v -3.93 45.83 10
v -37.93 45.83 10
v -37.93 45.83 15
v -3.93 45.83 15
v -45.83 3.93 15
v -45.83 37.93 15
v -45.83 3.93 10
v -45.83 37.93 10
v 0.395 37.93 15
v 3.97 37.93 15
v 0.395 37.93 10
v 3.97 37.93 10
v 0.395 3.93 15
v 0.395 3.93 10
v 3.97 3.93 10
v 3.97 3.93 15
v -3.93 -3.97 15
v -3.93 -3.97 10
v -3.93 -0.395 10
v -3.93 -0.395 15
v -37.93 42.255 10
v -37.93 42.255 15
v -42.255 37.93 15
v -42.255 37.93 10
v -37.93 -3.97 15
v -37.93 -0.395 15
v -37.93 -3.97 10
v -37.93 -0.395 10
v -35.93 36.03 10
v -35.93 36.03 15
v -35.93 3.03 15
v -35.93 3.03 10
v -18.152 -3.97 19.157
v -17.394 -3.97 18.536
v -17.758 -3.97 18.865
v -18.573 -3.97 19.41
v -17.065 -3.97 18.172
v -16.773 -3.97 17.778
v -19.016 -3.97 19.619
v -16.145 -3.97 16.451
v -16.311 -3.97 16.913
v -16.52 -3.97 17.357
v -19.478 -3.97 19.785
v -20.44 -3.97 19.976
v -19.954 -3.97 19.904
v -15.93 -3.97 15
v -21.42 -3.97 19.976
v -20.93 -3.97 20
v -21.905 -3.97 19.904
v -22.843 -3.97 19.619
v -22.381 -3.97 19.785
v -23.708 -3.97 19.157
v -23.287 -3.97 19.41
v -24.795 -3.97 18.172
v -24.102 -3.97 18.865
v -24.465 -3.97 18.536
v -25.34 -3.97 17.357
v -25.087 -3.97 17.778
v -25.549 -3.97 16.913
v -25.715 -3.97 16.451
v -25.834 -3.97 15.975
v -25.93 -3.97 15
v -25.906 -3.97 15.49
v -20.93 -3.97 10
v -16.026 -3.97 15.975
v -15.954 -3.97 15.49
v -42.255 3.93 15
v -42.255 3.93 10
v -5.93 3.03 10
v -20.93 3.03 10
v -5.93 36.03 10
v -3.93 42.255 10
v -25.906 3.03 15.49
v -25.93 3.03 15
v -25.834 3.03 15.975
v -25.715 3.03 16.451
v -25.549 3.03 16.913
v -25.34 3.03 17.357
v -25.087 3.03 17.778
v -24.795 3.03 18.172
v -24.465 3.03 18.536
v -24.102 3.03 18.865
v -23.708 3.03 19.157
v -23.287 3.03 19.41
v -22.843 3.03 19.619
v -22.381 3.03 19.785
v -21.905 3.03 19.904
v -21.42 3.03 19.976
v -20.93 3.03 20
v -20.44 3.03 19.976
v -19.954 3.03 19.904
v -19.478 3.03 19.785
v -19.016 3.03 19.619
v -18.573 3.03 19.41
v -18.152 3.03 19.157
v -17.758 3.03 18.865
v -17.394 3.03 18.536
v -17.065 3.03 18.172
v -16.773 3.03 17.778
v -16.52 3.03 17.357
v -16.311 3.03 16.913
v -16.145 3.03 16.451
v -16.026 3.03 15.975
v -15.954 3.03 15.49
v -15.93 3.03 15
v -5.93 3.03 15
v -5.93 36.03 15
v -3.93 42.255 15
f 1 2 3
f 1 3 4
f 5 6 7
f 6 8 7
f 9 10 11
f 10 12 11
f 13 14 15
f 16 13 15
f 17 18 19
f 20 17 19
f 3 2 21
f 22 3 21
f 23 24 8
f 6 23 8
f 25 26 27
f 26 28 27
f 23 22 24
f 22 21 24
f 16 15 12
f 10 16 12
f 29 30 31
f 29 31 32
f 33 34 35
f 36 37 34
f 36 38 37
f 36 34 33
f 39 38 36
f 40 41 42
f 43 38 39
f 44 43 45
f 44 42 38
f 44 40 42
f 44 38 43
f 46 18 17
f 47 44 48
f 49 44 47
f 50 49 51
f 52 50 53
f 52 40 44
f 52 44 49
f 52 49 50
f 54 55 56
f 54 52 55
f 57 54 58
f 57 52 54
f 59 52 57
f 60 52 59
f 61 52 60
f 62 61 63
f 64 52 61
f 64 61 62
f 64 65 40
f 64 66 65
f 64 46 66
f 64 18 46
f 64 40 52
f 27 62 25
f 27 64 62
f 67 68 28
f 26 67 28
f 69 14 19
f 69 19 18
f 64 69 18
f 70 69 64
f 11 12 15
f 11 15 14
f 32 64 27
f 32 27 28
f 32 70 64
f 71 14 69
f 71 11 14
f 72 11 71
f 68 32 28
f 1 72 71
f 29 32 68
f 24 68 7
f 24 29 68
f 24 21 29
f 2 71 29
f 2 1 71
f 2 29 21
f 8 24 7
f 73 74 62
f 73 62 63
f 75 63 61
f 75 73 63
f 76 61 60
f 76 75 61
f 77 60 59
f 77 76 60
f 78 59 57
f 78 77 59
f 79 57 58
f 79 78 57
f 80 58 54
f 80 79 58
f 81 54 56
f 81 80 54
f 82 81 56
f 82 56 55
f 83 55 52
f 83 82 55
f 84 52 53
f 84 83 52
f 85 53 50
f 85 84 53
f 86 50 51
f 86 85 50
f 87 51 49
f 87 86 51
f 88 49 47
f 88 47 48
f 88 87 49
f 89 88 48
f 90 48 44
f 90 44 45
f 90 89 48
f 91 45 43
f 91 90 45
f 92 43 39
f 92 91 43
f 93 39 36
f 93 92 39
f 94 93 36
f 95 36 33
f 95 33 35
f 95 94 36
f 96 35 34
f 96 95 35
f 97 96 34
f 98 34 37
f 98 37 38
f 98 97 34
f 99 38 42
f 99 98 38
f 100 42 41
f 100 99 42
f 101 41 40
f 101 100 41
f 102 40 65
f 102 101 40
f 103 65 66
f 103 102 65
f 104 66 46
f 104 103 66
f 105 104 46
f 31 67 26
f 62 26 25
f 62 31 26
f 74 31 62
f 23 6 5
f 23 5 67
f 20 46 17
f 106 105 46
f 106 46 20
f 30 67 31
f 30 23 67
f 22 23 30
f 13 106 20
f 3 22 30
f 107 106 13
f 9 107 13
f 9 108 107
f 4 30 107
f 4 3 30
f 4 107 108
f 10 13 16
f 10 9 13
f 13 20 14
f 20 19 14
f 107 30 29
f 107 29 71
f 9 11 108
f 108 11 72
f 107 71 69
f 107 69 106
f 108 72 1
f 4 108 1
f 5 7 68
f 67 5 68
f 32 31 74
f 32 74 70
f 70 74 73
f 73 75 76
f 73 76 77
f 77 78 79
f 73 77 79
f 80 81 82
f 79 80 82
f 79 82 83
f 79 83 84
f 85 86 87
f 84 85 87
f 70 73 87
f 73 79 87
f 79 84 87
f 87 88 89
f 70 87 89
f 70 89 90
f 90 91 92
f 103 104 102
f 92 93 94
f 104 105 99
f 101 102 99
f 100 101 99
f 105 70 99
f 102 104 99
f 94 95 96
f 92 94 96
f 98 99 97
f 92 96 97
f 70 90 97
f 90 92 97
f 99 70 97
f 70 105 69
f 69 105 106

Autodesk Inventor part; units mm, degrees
ref_plane "YZ Plane" through (0, 0, 0) normal (1, 0, 0) x (0, 1, 0)
ref_plane "XZ Plane" through (0, 0, 0) normal (0, 1, 0) x (-1, 0, 0)
ref_plane "Work Plane1" through (0, 0, 10) normal (0, 0, 1) x (1, 0, 0)
sketch "Sketch1" plane through (0, 0, 10) normal (0, 0, 1) x (1, 0, 0)
  line L0 (-4.0299, -0.3538) -> (-2.2322, 1.4439) construction
  arc A0 (-1.4439, 2.2322) -> (-2.2322, 1.4439) centre (-0.9299, 0.9299) ccw construction
  line L1 (-1.4439, 2.2322) -> (0.3538, 4.0299) construction
  line L2 (-37.8299, 42.2137) -> (-37.8299, 45.8299) construction
  line L3 (-37.8299, 45.8299) -> (-4.0299, 45.8299) construction
  line L4 (-4.0299, 45.8299) -> (-4.0299, 42.2137) construction
  line L5 (-4.0299, 4.0299) -> (0.3538, 4.0299) projected
  circle A1 centre (-20.9299, 20.9299) radius 17.5 projected
  line L6 (-20.9299, 58.9723) -> (17.1124, 20.9299) construction
  line L7 (17.1124, 20.9299) -> (-20.9299, -17.1124) construction
  line L8 (-20.9299, -17.1124) -> (-58.9723, 20.9299) construction
  line L9 (-58.9723, 20.9299) -> (-20.9299, 58.9723) construction
  line L10 (-20.9299, 58.9723) -> (-20.9299, -17.1124) construction
  line L11 (17.1124, 20.9299) -> (-58.9723, 20.9299) construction
  line L12 (-20.9299, 58.9723) -> (32.8701, 58.9723) construction
  line L13 (-43.4299, 43.4299) -> (1.5701, 43.4299) construction
  line L14 (1.5701, 43.4299) -> (1.5701, -1.5701) construction
  line L15 (1.5701, -1.5701) -> (-43.4299, -1.5701) construction
  line L16 (-43.4299, -1.5701) -> (-43.4299, 43.4299) construction
  line L17 (-43.4299, 43.4299) -> (1.5701, -1.5701) construction
  line L18 (1.5701, 43.4299) -> (-43.4299, -1.5701) construction
  line L19 (-43.4299, 5.3876) -> (-43.4299, 36.4723)
  line L20 (-43.4299, 36.4723) -> (-36.4723, 43.4299)
  line L21 (-36.4723, 43.4299) -> (-5.3876, 43.4299)
  line L22 (-5.3876, 43.4299) -> (1.5701, 36.4723)
  line L23 (1.5701, 36.4723) -> (1.5701, 5.3876)
  line L24 (1.5701, 5.3876) -> (-5.3876, -1.5701)
  line L25 (-5.3876, -1.5701) -> (-36.4723, -1.5701)
  line L26 (-36.4723, -1.5701) -> (-43.4299, 5.3876)
  line L27 (-4.0299, 42.2137) -> (-37.8299, 42.2137) projected
  line L28 (-4.0299, -0.3538) -> (-4.0299, 4.0299) projected
  circle A2 centre (-20.9299, 20.9299) radius 0.4266
  point P0 (-37.8299, 4.0299)
  dimension "d18" = 53.8
  dimension "d19" = 45
  dimension "d20" = 53.8
  dimension "d21" = 45
  dimension "d22" = 45
extrude "Extrusion1" add sketch "Sketch1" along normal blind 5 contours L28 L24 L25 L26 L19 L20 L27 L22 L23 L5 | L5 L24 L28 | L27 L20 L21 L22 | A1
sketch "Sketch3" plane through (0, 0, 10) normal (0, 0, -1) x (-1, 0, 0)
  line L0 (37.8299, -0.4701) -> (37.8299, 4.0299) construction
  line L1 (4.0299, 4.0299) -> (4.0299, -0.4701) construction
  line L2 (37.8299, -0.4701) -> (37.8299, 1.1886) construction
  line L3 (4.0299, -3.9701) -> (4.0299, -0.3538) construction
  line L4 (45.8299, 4.0299) -> (42.2137, 4.0299) construction
  line L5 (-0.3538, 4.0299) -> (-3.9701, 4.0299) construction
  line L6 (-3.9701, 37.8299) -> (-0.3538, 37.8299) construction
  line L7 (4.0299, 42.2137) -> (4.0299, 45.8299) construction
  line L8 (37.8299, 45.8299) -> (37.8299, 42.2137) construction
  line L9 (42.2137, 37.8299) -> (45.8299, 37.8299) construction
  line L10 (37.8299, 37.7299) -> (45.8299, 37.7299)
  line L11 (45.8299, 37.7299) -> (45.8299, 4.1299)
  line L12 (45.8299, 4.1299) -> (37.8299, 4.1299)
  line L13 (37.8299, 4.1299) -> (37.8299, 37.7299)
  line L14 (37.7299, 4.0299) -> (4.1299, 4.0299)
  line L15 (4.1299, 4.0299) -> (4.1299, -3.9701)
  line L16 (4.1299, -3.9701) -> (37.7299, -3.9701)
  line L17 (37.7299, -3.9701) -> (37.7299, 4.0299)
  line L18 (4.0299, 4.1299) -> (-3.9701, 4.1299)
  line L19 (-3.9701, 4.1299) -> (-3.9701, 37.7299)
  line L20 (-3.9701, 37.7299) -> (4.0299, 37.7299)
  line L21 (4.0299, 37.7299) -> (4.0299, 4.1299)
  line L22 (4.1299, 37.8299) -> (37.7299, 37.8299)
  line L23 (37.7299, 37.8299) -> (37.7299, 45.8299)
  line L24 (37.7299, 45.8299) -> (4.1299, 45.8299)
  line L25 (4.1299, 45.8299) -> (4.1299, 37.8299)
  point P0 (0, 0)
  dimension "d23" = 0.1
  dimension "d24" = 0.1
  dimension "d25" = 0.1
  dimension "d26" = 0.1
  dimension "d27" = 0.1
extrude "Extrusion3" add sketch "Sketch3" against normal up to surface (5 mm away)
sketch "Skizze12" plane through (0, 0, 10) normal (0, 0, -1) x (-1, 0, 0)
  line L0 (-0.3124, 4.1299) -> (4.1299, -0.3124) projected
  line L1 (4.1299, -0.3124) -> (4.1299, -3.9701) projected
  line L2 (4.1299, -3.9701) -> (37.7299, -3.9701) construction
  line L3 (37.7299, -3.9701) -> (37.7299, -0.3124) projected
  line L4 (37.7299, -0.3124) -> (42.1723, 4.1299) projected
  line L5 (45.8299, 4.1299) -> (42.1723, 4.1299) projected
  line L6 (45.8299, 37.7299) -> (45.8299, 4.1299) construction
  line L7 (42.1723, 37.7299) -> (45.8299, 37.7299) projected
  line L8 (42.1723, 37.7299) -> (37.7299, 42.1723) projected
  line L9 (37.7299, 42.1723) -> (37.7299, 45.8299) projected
  line L10 (37.7299, 45.8299) -> (4.1299, 45.8299) construction
  line L11 (4.1299, 45.8299) -> (4.1299, 42.1723) projected
  line L12 (4.1299, 42.1723) -> (-0.3124, 37.7299) projected
  line L13 (-3.9701, 37.7299) -> (-0.3124, 37.7299) projected
  line L14 (-3.9701, 4.1299) -> (-3.9701, 37.7299) construction
  line L15 (-0.3124, 4.1299) -> (-3.9701, 4.1299) projected
  circle A0 centre (20.9299, 20.9299) radius 0.4266 construction
  line L16 (37.9299, -4.1701) -> (3.9299, -4.1701) construction
  line L17 (3.9299, -4.1701) -> (3.9299, -0.3953)
  line L18 (3.9299, -0.3953) -> (-0.3953, 3.9299)
  line L19 (-0.3953, 3.9299) -> (-4.1701, 3.9299)
  line L20 (-4.1701, 3.9299) -> (-4.1701, 37.9299) construction
  line L21 (-4.1701, 37.9299) -> (-0.3953, 37.9299)
  line L22 (-0.3953, 37.9299) -> (3.9299, 42.2551)
  line L23 (3.9299, 42.2551) -> (3.9299, 46.0299)
  line L24 (3.9299, 46.0299) -> (37.9299, 46.0299) construction
  line L25 (37.9299, 46.0299) -> (37.9299, 42.2551)
  line L26 (37.9299, 42.2551) -> (42.2551, 37.9299)
  line L27 (42.2551, 37.9299) -> (46.0299, 37.9299)
  line L28 (46.0299, 37.9299) -> (46.0299, 3.9299) construction
  line L29 (46.0299, 3.9299) -> (42.2551, 3.9299)
  line L30 (42.2551, 3.9299) -> (37.9299, -0.3953)
  line L31 (37.9299, -0.3953) -> (37.9299, -4.1701)
  line L32 (-3.9701, 37.7299) -> (-3.9701, 37.9299)
  line L33 (37.7299, 45.8299) -> (4.1299, 45.8299) projected
  line L34 (4.1299, 45.8299) -> (3.9299, 45.8299)
  line L35 (37.7299, 45.8299) -> (37.9299, 45.8299)
  line L36 (45.8299, 37.7299) -> (45.8299, 37.9299)
  line L37 (45.8299, 4.1299) -> (45.8299, 3.9299)
  line L38 (37.7299, -3.9701) -> (37.9299, -3.9701)
  line L39 (4.1299, -3.9701) -> (3.9299, -3.9701)
  line L40 (-3.9701, 4.1299) -> (-3.9701, 3.9299)
  point P0 (0, 0)
  dimension "d65" = 0.2
extrude "IM_offset" add sketch "Skizze12" against normal up to surface (5 mm away)
ref_plane "Work Plane4" through (-37.9299, 6.0299, 10) normal (0, -1, 0) x (1, 0, 0)
sketch "Sketch17" plane through (-37.9299, 6.0299, 10) normal (0, -1, 0) x (1, 0, 0)
  line L0 (0, 5) -> (34, 5) projected
  line L1 (34, 0) -> (34, 5) projected
  line L2 (0, 0) -> (34, 0) projected
  line L3 (0, 0) -> (0, 5) projected
  line L4 (17.4266, 0) -> (16.5734, 0) projected
  line L5 (16.5734, 5) -> (17.4266, 5) projected
  line L6 (17.4266, 0) -> (16.5734, 0) projected
  line L7 (32, 5) -> (2, 5)
  line L8 (2, 5) -> (2, 0)
  line L9 (2, 0) -> (32, 0)
  line L10 (32, 0) -> (32, 5)
  line L11 (32, 5) -> (2, 0) construction
  line L12 (2, 5) -> (32, 0) construction
  point P0 (37.9299, -10)
  point P1 (17, 2.5)
  dimension "d91" = 30
extrude "Extrusion15" cut sketch "Sketch17" along normal blind 3 and the other way blind 30 contours L0 L10 L2 L8
sketch "Sketch18" plane through (-37.9299, 3.0299, 10) normal (0, -1, 0) x (1, 0, 0)
  line L0 (0, 5) -> (34, 5) projected
  line L1 (34, 0) -> (34, 5) projected
  line L2 (0, 0) -> (34, 0) projected
  line L3 (0, 0) -> (0, 5) projected
  line L4 (2, 5) -> (32, 5) projected
  circle A0 centre (17, 5) radius 5
  point P0 (37.9299, -10)
  point P1 (32, -5)
  point P2 (2, -5)
extrude "Extrusion16" add sketch "Sketch18" along normal up to surface (7 mm away) contours A0 L0 | L0 A0
properties part number "20_Cube_Insert_Despeckler_upright_motor_v3"
